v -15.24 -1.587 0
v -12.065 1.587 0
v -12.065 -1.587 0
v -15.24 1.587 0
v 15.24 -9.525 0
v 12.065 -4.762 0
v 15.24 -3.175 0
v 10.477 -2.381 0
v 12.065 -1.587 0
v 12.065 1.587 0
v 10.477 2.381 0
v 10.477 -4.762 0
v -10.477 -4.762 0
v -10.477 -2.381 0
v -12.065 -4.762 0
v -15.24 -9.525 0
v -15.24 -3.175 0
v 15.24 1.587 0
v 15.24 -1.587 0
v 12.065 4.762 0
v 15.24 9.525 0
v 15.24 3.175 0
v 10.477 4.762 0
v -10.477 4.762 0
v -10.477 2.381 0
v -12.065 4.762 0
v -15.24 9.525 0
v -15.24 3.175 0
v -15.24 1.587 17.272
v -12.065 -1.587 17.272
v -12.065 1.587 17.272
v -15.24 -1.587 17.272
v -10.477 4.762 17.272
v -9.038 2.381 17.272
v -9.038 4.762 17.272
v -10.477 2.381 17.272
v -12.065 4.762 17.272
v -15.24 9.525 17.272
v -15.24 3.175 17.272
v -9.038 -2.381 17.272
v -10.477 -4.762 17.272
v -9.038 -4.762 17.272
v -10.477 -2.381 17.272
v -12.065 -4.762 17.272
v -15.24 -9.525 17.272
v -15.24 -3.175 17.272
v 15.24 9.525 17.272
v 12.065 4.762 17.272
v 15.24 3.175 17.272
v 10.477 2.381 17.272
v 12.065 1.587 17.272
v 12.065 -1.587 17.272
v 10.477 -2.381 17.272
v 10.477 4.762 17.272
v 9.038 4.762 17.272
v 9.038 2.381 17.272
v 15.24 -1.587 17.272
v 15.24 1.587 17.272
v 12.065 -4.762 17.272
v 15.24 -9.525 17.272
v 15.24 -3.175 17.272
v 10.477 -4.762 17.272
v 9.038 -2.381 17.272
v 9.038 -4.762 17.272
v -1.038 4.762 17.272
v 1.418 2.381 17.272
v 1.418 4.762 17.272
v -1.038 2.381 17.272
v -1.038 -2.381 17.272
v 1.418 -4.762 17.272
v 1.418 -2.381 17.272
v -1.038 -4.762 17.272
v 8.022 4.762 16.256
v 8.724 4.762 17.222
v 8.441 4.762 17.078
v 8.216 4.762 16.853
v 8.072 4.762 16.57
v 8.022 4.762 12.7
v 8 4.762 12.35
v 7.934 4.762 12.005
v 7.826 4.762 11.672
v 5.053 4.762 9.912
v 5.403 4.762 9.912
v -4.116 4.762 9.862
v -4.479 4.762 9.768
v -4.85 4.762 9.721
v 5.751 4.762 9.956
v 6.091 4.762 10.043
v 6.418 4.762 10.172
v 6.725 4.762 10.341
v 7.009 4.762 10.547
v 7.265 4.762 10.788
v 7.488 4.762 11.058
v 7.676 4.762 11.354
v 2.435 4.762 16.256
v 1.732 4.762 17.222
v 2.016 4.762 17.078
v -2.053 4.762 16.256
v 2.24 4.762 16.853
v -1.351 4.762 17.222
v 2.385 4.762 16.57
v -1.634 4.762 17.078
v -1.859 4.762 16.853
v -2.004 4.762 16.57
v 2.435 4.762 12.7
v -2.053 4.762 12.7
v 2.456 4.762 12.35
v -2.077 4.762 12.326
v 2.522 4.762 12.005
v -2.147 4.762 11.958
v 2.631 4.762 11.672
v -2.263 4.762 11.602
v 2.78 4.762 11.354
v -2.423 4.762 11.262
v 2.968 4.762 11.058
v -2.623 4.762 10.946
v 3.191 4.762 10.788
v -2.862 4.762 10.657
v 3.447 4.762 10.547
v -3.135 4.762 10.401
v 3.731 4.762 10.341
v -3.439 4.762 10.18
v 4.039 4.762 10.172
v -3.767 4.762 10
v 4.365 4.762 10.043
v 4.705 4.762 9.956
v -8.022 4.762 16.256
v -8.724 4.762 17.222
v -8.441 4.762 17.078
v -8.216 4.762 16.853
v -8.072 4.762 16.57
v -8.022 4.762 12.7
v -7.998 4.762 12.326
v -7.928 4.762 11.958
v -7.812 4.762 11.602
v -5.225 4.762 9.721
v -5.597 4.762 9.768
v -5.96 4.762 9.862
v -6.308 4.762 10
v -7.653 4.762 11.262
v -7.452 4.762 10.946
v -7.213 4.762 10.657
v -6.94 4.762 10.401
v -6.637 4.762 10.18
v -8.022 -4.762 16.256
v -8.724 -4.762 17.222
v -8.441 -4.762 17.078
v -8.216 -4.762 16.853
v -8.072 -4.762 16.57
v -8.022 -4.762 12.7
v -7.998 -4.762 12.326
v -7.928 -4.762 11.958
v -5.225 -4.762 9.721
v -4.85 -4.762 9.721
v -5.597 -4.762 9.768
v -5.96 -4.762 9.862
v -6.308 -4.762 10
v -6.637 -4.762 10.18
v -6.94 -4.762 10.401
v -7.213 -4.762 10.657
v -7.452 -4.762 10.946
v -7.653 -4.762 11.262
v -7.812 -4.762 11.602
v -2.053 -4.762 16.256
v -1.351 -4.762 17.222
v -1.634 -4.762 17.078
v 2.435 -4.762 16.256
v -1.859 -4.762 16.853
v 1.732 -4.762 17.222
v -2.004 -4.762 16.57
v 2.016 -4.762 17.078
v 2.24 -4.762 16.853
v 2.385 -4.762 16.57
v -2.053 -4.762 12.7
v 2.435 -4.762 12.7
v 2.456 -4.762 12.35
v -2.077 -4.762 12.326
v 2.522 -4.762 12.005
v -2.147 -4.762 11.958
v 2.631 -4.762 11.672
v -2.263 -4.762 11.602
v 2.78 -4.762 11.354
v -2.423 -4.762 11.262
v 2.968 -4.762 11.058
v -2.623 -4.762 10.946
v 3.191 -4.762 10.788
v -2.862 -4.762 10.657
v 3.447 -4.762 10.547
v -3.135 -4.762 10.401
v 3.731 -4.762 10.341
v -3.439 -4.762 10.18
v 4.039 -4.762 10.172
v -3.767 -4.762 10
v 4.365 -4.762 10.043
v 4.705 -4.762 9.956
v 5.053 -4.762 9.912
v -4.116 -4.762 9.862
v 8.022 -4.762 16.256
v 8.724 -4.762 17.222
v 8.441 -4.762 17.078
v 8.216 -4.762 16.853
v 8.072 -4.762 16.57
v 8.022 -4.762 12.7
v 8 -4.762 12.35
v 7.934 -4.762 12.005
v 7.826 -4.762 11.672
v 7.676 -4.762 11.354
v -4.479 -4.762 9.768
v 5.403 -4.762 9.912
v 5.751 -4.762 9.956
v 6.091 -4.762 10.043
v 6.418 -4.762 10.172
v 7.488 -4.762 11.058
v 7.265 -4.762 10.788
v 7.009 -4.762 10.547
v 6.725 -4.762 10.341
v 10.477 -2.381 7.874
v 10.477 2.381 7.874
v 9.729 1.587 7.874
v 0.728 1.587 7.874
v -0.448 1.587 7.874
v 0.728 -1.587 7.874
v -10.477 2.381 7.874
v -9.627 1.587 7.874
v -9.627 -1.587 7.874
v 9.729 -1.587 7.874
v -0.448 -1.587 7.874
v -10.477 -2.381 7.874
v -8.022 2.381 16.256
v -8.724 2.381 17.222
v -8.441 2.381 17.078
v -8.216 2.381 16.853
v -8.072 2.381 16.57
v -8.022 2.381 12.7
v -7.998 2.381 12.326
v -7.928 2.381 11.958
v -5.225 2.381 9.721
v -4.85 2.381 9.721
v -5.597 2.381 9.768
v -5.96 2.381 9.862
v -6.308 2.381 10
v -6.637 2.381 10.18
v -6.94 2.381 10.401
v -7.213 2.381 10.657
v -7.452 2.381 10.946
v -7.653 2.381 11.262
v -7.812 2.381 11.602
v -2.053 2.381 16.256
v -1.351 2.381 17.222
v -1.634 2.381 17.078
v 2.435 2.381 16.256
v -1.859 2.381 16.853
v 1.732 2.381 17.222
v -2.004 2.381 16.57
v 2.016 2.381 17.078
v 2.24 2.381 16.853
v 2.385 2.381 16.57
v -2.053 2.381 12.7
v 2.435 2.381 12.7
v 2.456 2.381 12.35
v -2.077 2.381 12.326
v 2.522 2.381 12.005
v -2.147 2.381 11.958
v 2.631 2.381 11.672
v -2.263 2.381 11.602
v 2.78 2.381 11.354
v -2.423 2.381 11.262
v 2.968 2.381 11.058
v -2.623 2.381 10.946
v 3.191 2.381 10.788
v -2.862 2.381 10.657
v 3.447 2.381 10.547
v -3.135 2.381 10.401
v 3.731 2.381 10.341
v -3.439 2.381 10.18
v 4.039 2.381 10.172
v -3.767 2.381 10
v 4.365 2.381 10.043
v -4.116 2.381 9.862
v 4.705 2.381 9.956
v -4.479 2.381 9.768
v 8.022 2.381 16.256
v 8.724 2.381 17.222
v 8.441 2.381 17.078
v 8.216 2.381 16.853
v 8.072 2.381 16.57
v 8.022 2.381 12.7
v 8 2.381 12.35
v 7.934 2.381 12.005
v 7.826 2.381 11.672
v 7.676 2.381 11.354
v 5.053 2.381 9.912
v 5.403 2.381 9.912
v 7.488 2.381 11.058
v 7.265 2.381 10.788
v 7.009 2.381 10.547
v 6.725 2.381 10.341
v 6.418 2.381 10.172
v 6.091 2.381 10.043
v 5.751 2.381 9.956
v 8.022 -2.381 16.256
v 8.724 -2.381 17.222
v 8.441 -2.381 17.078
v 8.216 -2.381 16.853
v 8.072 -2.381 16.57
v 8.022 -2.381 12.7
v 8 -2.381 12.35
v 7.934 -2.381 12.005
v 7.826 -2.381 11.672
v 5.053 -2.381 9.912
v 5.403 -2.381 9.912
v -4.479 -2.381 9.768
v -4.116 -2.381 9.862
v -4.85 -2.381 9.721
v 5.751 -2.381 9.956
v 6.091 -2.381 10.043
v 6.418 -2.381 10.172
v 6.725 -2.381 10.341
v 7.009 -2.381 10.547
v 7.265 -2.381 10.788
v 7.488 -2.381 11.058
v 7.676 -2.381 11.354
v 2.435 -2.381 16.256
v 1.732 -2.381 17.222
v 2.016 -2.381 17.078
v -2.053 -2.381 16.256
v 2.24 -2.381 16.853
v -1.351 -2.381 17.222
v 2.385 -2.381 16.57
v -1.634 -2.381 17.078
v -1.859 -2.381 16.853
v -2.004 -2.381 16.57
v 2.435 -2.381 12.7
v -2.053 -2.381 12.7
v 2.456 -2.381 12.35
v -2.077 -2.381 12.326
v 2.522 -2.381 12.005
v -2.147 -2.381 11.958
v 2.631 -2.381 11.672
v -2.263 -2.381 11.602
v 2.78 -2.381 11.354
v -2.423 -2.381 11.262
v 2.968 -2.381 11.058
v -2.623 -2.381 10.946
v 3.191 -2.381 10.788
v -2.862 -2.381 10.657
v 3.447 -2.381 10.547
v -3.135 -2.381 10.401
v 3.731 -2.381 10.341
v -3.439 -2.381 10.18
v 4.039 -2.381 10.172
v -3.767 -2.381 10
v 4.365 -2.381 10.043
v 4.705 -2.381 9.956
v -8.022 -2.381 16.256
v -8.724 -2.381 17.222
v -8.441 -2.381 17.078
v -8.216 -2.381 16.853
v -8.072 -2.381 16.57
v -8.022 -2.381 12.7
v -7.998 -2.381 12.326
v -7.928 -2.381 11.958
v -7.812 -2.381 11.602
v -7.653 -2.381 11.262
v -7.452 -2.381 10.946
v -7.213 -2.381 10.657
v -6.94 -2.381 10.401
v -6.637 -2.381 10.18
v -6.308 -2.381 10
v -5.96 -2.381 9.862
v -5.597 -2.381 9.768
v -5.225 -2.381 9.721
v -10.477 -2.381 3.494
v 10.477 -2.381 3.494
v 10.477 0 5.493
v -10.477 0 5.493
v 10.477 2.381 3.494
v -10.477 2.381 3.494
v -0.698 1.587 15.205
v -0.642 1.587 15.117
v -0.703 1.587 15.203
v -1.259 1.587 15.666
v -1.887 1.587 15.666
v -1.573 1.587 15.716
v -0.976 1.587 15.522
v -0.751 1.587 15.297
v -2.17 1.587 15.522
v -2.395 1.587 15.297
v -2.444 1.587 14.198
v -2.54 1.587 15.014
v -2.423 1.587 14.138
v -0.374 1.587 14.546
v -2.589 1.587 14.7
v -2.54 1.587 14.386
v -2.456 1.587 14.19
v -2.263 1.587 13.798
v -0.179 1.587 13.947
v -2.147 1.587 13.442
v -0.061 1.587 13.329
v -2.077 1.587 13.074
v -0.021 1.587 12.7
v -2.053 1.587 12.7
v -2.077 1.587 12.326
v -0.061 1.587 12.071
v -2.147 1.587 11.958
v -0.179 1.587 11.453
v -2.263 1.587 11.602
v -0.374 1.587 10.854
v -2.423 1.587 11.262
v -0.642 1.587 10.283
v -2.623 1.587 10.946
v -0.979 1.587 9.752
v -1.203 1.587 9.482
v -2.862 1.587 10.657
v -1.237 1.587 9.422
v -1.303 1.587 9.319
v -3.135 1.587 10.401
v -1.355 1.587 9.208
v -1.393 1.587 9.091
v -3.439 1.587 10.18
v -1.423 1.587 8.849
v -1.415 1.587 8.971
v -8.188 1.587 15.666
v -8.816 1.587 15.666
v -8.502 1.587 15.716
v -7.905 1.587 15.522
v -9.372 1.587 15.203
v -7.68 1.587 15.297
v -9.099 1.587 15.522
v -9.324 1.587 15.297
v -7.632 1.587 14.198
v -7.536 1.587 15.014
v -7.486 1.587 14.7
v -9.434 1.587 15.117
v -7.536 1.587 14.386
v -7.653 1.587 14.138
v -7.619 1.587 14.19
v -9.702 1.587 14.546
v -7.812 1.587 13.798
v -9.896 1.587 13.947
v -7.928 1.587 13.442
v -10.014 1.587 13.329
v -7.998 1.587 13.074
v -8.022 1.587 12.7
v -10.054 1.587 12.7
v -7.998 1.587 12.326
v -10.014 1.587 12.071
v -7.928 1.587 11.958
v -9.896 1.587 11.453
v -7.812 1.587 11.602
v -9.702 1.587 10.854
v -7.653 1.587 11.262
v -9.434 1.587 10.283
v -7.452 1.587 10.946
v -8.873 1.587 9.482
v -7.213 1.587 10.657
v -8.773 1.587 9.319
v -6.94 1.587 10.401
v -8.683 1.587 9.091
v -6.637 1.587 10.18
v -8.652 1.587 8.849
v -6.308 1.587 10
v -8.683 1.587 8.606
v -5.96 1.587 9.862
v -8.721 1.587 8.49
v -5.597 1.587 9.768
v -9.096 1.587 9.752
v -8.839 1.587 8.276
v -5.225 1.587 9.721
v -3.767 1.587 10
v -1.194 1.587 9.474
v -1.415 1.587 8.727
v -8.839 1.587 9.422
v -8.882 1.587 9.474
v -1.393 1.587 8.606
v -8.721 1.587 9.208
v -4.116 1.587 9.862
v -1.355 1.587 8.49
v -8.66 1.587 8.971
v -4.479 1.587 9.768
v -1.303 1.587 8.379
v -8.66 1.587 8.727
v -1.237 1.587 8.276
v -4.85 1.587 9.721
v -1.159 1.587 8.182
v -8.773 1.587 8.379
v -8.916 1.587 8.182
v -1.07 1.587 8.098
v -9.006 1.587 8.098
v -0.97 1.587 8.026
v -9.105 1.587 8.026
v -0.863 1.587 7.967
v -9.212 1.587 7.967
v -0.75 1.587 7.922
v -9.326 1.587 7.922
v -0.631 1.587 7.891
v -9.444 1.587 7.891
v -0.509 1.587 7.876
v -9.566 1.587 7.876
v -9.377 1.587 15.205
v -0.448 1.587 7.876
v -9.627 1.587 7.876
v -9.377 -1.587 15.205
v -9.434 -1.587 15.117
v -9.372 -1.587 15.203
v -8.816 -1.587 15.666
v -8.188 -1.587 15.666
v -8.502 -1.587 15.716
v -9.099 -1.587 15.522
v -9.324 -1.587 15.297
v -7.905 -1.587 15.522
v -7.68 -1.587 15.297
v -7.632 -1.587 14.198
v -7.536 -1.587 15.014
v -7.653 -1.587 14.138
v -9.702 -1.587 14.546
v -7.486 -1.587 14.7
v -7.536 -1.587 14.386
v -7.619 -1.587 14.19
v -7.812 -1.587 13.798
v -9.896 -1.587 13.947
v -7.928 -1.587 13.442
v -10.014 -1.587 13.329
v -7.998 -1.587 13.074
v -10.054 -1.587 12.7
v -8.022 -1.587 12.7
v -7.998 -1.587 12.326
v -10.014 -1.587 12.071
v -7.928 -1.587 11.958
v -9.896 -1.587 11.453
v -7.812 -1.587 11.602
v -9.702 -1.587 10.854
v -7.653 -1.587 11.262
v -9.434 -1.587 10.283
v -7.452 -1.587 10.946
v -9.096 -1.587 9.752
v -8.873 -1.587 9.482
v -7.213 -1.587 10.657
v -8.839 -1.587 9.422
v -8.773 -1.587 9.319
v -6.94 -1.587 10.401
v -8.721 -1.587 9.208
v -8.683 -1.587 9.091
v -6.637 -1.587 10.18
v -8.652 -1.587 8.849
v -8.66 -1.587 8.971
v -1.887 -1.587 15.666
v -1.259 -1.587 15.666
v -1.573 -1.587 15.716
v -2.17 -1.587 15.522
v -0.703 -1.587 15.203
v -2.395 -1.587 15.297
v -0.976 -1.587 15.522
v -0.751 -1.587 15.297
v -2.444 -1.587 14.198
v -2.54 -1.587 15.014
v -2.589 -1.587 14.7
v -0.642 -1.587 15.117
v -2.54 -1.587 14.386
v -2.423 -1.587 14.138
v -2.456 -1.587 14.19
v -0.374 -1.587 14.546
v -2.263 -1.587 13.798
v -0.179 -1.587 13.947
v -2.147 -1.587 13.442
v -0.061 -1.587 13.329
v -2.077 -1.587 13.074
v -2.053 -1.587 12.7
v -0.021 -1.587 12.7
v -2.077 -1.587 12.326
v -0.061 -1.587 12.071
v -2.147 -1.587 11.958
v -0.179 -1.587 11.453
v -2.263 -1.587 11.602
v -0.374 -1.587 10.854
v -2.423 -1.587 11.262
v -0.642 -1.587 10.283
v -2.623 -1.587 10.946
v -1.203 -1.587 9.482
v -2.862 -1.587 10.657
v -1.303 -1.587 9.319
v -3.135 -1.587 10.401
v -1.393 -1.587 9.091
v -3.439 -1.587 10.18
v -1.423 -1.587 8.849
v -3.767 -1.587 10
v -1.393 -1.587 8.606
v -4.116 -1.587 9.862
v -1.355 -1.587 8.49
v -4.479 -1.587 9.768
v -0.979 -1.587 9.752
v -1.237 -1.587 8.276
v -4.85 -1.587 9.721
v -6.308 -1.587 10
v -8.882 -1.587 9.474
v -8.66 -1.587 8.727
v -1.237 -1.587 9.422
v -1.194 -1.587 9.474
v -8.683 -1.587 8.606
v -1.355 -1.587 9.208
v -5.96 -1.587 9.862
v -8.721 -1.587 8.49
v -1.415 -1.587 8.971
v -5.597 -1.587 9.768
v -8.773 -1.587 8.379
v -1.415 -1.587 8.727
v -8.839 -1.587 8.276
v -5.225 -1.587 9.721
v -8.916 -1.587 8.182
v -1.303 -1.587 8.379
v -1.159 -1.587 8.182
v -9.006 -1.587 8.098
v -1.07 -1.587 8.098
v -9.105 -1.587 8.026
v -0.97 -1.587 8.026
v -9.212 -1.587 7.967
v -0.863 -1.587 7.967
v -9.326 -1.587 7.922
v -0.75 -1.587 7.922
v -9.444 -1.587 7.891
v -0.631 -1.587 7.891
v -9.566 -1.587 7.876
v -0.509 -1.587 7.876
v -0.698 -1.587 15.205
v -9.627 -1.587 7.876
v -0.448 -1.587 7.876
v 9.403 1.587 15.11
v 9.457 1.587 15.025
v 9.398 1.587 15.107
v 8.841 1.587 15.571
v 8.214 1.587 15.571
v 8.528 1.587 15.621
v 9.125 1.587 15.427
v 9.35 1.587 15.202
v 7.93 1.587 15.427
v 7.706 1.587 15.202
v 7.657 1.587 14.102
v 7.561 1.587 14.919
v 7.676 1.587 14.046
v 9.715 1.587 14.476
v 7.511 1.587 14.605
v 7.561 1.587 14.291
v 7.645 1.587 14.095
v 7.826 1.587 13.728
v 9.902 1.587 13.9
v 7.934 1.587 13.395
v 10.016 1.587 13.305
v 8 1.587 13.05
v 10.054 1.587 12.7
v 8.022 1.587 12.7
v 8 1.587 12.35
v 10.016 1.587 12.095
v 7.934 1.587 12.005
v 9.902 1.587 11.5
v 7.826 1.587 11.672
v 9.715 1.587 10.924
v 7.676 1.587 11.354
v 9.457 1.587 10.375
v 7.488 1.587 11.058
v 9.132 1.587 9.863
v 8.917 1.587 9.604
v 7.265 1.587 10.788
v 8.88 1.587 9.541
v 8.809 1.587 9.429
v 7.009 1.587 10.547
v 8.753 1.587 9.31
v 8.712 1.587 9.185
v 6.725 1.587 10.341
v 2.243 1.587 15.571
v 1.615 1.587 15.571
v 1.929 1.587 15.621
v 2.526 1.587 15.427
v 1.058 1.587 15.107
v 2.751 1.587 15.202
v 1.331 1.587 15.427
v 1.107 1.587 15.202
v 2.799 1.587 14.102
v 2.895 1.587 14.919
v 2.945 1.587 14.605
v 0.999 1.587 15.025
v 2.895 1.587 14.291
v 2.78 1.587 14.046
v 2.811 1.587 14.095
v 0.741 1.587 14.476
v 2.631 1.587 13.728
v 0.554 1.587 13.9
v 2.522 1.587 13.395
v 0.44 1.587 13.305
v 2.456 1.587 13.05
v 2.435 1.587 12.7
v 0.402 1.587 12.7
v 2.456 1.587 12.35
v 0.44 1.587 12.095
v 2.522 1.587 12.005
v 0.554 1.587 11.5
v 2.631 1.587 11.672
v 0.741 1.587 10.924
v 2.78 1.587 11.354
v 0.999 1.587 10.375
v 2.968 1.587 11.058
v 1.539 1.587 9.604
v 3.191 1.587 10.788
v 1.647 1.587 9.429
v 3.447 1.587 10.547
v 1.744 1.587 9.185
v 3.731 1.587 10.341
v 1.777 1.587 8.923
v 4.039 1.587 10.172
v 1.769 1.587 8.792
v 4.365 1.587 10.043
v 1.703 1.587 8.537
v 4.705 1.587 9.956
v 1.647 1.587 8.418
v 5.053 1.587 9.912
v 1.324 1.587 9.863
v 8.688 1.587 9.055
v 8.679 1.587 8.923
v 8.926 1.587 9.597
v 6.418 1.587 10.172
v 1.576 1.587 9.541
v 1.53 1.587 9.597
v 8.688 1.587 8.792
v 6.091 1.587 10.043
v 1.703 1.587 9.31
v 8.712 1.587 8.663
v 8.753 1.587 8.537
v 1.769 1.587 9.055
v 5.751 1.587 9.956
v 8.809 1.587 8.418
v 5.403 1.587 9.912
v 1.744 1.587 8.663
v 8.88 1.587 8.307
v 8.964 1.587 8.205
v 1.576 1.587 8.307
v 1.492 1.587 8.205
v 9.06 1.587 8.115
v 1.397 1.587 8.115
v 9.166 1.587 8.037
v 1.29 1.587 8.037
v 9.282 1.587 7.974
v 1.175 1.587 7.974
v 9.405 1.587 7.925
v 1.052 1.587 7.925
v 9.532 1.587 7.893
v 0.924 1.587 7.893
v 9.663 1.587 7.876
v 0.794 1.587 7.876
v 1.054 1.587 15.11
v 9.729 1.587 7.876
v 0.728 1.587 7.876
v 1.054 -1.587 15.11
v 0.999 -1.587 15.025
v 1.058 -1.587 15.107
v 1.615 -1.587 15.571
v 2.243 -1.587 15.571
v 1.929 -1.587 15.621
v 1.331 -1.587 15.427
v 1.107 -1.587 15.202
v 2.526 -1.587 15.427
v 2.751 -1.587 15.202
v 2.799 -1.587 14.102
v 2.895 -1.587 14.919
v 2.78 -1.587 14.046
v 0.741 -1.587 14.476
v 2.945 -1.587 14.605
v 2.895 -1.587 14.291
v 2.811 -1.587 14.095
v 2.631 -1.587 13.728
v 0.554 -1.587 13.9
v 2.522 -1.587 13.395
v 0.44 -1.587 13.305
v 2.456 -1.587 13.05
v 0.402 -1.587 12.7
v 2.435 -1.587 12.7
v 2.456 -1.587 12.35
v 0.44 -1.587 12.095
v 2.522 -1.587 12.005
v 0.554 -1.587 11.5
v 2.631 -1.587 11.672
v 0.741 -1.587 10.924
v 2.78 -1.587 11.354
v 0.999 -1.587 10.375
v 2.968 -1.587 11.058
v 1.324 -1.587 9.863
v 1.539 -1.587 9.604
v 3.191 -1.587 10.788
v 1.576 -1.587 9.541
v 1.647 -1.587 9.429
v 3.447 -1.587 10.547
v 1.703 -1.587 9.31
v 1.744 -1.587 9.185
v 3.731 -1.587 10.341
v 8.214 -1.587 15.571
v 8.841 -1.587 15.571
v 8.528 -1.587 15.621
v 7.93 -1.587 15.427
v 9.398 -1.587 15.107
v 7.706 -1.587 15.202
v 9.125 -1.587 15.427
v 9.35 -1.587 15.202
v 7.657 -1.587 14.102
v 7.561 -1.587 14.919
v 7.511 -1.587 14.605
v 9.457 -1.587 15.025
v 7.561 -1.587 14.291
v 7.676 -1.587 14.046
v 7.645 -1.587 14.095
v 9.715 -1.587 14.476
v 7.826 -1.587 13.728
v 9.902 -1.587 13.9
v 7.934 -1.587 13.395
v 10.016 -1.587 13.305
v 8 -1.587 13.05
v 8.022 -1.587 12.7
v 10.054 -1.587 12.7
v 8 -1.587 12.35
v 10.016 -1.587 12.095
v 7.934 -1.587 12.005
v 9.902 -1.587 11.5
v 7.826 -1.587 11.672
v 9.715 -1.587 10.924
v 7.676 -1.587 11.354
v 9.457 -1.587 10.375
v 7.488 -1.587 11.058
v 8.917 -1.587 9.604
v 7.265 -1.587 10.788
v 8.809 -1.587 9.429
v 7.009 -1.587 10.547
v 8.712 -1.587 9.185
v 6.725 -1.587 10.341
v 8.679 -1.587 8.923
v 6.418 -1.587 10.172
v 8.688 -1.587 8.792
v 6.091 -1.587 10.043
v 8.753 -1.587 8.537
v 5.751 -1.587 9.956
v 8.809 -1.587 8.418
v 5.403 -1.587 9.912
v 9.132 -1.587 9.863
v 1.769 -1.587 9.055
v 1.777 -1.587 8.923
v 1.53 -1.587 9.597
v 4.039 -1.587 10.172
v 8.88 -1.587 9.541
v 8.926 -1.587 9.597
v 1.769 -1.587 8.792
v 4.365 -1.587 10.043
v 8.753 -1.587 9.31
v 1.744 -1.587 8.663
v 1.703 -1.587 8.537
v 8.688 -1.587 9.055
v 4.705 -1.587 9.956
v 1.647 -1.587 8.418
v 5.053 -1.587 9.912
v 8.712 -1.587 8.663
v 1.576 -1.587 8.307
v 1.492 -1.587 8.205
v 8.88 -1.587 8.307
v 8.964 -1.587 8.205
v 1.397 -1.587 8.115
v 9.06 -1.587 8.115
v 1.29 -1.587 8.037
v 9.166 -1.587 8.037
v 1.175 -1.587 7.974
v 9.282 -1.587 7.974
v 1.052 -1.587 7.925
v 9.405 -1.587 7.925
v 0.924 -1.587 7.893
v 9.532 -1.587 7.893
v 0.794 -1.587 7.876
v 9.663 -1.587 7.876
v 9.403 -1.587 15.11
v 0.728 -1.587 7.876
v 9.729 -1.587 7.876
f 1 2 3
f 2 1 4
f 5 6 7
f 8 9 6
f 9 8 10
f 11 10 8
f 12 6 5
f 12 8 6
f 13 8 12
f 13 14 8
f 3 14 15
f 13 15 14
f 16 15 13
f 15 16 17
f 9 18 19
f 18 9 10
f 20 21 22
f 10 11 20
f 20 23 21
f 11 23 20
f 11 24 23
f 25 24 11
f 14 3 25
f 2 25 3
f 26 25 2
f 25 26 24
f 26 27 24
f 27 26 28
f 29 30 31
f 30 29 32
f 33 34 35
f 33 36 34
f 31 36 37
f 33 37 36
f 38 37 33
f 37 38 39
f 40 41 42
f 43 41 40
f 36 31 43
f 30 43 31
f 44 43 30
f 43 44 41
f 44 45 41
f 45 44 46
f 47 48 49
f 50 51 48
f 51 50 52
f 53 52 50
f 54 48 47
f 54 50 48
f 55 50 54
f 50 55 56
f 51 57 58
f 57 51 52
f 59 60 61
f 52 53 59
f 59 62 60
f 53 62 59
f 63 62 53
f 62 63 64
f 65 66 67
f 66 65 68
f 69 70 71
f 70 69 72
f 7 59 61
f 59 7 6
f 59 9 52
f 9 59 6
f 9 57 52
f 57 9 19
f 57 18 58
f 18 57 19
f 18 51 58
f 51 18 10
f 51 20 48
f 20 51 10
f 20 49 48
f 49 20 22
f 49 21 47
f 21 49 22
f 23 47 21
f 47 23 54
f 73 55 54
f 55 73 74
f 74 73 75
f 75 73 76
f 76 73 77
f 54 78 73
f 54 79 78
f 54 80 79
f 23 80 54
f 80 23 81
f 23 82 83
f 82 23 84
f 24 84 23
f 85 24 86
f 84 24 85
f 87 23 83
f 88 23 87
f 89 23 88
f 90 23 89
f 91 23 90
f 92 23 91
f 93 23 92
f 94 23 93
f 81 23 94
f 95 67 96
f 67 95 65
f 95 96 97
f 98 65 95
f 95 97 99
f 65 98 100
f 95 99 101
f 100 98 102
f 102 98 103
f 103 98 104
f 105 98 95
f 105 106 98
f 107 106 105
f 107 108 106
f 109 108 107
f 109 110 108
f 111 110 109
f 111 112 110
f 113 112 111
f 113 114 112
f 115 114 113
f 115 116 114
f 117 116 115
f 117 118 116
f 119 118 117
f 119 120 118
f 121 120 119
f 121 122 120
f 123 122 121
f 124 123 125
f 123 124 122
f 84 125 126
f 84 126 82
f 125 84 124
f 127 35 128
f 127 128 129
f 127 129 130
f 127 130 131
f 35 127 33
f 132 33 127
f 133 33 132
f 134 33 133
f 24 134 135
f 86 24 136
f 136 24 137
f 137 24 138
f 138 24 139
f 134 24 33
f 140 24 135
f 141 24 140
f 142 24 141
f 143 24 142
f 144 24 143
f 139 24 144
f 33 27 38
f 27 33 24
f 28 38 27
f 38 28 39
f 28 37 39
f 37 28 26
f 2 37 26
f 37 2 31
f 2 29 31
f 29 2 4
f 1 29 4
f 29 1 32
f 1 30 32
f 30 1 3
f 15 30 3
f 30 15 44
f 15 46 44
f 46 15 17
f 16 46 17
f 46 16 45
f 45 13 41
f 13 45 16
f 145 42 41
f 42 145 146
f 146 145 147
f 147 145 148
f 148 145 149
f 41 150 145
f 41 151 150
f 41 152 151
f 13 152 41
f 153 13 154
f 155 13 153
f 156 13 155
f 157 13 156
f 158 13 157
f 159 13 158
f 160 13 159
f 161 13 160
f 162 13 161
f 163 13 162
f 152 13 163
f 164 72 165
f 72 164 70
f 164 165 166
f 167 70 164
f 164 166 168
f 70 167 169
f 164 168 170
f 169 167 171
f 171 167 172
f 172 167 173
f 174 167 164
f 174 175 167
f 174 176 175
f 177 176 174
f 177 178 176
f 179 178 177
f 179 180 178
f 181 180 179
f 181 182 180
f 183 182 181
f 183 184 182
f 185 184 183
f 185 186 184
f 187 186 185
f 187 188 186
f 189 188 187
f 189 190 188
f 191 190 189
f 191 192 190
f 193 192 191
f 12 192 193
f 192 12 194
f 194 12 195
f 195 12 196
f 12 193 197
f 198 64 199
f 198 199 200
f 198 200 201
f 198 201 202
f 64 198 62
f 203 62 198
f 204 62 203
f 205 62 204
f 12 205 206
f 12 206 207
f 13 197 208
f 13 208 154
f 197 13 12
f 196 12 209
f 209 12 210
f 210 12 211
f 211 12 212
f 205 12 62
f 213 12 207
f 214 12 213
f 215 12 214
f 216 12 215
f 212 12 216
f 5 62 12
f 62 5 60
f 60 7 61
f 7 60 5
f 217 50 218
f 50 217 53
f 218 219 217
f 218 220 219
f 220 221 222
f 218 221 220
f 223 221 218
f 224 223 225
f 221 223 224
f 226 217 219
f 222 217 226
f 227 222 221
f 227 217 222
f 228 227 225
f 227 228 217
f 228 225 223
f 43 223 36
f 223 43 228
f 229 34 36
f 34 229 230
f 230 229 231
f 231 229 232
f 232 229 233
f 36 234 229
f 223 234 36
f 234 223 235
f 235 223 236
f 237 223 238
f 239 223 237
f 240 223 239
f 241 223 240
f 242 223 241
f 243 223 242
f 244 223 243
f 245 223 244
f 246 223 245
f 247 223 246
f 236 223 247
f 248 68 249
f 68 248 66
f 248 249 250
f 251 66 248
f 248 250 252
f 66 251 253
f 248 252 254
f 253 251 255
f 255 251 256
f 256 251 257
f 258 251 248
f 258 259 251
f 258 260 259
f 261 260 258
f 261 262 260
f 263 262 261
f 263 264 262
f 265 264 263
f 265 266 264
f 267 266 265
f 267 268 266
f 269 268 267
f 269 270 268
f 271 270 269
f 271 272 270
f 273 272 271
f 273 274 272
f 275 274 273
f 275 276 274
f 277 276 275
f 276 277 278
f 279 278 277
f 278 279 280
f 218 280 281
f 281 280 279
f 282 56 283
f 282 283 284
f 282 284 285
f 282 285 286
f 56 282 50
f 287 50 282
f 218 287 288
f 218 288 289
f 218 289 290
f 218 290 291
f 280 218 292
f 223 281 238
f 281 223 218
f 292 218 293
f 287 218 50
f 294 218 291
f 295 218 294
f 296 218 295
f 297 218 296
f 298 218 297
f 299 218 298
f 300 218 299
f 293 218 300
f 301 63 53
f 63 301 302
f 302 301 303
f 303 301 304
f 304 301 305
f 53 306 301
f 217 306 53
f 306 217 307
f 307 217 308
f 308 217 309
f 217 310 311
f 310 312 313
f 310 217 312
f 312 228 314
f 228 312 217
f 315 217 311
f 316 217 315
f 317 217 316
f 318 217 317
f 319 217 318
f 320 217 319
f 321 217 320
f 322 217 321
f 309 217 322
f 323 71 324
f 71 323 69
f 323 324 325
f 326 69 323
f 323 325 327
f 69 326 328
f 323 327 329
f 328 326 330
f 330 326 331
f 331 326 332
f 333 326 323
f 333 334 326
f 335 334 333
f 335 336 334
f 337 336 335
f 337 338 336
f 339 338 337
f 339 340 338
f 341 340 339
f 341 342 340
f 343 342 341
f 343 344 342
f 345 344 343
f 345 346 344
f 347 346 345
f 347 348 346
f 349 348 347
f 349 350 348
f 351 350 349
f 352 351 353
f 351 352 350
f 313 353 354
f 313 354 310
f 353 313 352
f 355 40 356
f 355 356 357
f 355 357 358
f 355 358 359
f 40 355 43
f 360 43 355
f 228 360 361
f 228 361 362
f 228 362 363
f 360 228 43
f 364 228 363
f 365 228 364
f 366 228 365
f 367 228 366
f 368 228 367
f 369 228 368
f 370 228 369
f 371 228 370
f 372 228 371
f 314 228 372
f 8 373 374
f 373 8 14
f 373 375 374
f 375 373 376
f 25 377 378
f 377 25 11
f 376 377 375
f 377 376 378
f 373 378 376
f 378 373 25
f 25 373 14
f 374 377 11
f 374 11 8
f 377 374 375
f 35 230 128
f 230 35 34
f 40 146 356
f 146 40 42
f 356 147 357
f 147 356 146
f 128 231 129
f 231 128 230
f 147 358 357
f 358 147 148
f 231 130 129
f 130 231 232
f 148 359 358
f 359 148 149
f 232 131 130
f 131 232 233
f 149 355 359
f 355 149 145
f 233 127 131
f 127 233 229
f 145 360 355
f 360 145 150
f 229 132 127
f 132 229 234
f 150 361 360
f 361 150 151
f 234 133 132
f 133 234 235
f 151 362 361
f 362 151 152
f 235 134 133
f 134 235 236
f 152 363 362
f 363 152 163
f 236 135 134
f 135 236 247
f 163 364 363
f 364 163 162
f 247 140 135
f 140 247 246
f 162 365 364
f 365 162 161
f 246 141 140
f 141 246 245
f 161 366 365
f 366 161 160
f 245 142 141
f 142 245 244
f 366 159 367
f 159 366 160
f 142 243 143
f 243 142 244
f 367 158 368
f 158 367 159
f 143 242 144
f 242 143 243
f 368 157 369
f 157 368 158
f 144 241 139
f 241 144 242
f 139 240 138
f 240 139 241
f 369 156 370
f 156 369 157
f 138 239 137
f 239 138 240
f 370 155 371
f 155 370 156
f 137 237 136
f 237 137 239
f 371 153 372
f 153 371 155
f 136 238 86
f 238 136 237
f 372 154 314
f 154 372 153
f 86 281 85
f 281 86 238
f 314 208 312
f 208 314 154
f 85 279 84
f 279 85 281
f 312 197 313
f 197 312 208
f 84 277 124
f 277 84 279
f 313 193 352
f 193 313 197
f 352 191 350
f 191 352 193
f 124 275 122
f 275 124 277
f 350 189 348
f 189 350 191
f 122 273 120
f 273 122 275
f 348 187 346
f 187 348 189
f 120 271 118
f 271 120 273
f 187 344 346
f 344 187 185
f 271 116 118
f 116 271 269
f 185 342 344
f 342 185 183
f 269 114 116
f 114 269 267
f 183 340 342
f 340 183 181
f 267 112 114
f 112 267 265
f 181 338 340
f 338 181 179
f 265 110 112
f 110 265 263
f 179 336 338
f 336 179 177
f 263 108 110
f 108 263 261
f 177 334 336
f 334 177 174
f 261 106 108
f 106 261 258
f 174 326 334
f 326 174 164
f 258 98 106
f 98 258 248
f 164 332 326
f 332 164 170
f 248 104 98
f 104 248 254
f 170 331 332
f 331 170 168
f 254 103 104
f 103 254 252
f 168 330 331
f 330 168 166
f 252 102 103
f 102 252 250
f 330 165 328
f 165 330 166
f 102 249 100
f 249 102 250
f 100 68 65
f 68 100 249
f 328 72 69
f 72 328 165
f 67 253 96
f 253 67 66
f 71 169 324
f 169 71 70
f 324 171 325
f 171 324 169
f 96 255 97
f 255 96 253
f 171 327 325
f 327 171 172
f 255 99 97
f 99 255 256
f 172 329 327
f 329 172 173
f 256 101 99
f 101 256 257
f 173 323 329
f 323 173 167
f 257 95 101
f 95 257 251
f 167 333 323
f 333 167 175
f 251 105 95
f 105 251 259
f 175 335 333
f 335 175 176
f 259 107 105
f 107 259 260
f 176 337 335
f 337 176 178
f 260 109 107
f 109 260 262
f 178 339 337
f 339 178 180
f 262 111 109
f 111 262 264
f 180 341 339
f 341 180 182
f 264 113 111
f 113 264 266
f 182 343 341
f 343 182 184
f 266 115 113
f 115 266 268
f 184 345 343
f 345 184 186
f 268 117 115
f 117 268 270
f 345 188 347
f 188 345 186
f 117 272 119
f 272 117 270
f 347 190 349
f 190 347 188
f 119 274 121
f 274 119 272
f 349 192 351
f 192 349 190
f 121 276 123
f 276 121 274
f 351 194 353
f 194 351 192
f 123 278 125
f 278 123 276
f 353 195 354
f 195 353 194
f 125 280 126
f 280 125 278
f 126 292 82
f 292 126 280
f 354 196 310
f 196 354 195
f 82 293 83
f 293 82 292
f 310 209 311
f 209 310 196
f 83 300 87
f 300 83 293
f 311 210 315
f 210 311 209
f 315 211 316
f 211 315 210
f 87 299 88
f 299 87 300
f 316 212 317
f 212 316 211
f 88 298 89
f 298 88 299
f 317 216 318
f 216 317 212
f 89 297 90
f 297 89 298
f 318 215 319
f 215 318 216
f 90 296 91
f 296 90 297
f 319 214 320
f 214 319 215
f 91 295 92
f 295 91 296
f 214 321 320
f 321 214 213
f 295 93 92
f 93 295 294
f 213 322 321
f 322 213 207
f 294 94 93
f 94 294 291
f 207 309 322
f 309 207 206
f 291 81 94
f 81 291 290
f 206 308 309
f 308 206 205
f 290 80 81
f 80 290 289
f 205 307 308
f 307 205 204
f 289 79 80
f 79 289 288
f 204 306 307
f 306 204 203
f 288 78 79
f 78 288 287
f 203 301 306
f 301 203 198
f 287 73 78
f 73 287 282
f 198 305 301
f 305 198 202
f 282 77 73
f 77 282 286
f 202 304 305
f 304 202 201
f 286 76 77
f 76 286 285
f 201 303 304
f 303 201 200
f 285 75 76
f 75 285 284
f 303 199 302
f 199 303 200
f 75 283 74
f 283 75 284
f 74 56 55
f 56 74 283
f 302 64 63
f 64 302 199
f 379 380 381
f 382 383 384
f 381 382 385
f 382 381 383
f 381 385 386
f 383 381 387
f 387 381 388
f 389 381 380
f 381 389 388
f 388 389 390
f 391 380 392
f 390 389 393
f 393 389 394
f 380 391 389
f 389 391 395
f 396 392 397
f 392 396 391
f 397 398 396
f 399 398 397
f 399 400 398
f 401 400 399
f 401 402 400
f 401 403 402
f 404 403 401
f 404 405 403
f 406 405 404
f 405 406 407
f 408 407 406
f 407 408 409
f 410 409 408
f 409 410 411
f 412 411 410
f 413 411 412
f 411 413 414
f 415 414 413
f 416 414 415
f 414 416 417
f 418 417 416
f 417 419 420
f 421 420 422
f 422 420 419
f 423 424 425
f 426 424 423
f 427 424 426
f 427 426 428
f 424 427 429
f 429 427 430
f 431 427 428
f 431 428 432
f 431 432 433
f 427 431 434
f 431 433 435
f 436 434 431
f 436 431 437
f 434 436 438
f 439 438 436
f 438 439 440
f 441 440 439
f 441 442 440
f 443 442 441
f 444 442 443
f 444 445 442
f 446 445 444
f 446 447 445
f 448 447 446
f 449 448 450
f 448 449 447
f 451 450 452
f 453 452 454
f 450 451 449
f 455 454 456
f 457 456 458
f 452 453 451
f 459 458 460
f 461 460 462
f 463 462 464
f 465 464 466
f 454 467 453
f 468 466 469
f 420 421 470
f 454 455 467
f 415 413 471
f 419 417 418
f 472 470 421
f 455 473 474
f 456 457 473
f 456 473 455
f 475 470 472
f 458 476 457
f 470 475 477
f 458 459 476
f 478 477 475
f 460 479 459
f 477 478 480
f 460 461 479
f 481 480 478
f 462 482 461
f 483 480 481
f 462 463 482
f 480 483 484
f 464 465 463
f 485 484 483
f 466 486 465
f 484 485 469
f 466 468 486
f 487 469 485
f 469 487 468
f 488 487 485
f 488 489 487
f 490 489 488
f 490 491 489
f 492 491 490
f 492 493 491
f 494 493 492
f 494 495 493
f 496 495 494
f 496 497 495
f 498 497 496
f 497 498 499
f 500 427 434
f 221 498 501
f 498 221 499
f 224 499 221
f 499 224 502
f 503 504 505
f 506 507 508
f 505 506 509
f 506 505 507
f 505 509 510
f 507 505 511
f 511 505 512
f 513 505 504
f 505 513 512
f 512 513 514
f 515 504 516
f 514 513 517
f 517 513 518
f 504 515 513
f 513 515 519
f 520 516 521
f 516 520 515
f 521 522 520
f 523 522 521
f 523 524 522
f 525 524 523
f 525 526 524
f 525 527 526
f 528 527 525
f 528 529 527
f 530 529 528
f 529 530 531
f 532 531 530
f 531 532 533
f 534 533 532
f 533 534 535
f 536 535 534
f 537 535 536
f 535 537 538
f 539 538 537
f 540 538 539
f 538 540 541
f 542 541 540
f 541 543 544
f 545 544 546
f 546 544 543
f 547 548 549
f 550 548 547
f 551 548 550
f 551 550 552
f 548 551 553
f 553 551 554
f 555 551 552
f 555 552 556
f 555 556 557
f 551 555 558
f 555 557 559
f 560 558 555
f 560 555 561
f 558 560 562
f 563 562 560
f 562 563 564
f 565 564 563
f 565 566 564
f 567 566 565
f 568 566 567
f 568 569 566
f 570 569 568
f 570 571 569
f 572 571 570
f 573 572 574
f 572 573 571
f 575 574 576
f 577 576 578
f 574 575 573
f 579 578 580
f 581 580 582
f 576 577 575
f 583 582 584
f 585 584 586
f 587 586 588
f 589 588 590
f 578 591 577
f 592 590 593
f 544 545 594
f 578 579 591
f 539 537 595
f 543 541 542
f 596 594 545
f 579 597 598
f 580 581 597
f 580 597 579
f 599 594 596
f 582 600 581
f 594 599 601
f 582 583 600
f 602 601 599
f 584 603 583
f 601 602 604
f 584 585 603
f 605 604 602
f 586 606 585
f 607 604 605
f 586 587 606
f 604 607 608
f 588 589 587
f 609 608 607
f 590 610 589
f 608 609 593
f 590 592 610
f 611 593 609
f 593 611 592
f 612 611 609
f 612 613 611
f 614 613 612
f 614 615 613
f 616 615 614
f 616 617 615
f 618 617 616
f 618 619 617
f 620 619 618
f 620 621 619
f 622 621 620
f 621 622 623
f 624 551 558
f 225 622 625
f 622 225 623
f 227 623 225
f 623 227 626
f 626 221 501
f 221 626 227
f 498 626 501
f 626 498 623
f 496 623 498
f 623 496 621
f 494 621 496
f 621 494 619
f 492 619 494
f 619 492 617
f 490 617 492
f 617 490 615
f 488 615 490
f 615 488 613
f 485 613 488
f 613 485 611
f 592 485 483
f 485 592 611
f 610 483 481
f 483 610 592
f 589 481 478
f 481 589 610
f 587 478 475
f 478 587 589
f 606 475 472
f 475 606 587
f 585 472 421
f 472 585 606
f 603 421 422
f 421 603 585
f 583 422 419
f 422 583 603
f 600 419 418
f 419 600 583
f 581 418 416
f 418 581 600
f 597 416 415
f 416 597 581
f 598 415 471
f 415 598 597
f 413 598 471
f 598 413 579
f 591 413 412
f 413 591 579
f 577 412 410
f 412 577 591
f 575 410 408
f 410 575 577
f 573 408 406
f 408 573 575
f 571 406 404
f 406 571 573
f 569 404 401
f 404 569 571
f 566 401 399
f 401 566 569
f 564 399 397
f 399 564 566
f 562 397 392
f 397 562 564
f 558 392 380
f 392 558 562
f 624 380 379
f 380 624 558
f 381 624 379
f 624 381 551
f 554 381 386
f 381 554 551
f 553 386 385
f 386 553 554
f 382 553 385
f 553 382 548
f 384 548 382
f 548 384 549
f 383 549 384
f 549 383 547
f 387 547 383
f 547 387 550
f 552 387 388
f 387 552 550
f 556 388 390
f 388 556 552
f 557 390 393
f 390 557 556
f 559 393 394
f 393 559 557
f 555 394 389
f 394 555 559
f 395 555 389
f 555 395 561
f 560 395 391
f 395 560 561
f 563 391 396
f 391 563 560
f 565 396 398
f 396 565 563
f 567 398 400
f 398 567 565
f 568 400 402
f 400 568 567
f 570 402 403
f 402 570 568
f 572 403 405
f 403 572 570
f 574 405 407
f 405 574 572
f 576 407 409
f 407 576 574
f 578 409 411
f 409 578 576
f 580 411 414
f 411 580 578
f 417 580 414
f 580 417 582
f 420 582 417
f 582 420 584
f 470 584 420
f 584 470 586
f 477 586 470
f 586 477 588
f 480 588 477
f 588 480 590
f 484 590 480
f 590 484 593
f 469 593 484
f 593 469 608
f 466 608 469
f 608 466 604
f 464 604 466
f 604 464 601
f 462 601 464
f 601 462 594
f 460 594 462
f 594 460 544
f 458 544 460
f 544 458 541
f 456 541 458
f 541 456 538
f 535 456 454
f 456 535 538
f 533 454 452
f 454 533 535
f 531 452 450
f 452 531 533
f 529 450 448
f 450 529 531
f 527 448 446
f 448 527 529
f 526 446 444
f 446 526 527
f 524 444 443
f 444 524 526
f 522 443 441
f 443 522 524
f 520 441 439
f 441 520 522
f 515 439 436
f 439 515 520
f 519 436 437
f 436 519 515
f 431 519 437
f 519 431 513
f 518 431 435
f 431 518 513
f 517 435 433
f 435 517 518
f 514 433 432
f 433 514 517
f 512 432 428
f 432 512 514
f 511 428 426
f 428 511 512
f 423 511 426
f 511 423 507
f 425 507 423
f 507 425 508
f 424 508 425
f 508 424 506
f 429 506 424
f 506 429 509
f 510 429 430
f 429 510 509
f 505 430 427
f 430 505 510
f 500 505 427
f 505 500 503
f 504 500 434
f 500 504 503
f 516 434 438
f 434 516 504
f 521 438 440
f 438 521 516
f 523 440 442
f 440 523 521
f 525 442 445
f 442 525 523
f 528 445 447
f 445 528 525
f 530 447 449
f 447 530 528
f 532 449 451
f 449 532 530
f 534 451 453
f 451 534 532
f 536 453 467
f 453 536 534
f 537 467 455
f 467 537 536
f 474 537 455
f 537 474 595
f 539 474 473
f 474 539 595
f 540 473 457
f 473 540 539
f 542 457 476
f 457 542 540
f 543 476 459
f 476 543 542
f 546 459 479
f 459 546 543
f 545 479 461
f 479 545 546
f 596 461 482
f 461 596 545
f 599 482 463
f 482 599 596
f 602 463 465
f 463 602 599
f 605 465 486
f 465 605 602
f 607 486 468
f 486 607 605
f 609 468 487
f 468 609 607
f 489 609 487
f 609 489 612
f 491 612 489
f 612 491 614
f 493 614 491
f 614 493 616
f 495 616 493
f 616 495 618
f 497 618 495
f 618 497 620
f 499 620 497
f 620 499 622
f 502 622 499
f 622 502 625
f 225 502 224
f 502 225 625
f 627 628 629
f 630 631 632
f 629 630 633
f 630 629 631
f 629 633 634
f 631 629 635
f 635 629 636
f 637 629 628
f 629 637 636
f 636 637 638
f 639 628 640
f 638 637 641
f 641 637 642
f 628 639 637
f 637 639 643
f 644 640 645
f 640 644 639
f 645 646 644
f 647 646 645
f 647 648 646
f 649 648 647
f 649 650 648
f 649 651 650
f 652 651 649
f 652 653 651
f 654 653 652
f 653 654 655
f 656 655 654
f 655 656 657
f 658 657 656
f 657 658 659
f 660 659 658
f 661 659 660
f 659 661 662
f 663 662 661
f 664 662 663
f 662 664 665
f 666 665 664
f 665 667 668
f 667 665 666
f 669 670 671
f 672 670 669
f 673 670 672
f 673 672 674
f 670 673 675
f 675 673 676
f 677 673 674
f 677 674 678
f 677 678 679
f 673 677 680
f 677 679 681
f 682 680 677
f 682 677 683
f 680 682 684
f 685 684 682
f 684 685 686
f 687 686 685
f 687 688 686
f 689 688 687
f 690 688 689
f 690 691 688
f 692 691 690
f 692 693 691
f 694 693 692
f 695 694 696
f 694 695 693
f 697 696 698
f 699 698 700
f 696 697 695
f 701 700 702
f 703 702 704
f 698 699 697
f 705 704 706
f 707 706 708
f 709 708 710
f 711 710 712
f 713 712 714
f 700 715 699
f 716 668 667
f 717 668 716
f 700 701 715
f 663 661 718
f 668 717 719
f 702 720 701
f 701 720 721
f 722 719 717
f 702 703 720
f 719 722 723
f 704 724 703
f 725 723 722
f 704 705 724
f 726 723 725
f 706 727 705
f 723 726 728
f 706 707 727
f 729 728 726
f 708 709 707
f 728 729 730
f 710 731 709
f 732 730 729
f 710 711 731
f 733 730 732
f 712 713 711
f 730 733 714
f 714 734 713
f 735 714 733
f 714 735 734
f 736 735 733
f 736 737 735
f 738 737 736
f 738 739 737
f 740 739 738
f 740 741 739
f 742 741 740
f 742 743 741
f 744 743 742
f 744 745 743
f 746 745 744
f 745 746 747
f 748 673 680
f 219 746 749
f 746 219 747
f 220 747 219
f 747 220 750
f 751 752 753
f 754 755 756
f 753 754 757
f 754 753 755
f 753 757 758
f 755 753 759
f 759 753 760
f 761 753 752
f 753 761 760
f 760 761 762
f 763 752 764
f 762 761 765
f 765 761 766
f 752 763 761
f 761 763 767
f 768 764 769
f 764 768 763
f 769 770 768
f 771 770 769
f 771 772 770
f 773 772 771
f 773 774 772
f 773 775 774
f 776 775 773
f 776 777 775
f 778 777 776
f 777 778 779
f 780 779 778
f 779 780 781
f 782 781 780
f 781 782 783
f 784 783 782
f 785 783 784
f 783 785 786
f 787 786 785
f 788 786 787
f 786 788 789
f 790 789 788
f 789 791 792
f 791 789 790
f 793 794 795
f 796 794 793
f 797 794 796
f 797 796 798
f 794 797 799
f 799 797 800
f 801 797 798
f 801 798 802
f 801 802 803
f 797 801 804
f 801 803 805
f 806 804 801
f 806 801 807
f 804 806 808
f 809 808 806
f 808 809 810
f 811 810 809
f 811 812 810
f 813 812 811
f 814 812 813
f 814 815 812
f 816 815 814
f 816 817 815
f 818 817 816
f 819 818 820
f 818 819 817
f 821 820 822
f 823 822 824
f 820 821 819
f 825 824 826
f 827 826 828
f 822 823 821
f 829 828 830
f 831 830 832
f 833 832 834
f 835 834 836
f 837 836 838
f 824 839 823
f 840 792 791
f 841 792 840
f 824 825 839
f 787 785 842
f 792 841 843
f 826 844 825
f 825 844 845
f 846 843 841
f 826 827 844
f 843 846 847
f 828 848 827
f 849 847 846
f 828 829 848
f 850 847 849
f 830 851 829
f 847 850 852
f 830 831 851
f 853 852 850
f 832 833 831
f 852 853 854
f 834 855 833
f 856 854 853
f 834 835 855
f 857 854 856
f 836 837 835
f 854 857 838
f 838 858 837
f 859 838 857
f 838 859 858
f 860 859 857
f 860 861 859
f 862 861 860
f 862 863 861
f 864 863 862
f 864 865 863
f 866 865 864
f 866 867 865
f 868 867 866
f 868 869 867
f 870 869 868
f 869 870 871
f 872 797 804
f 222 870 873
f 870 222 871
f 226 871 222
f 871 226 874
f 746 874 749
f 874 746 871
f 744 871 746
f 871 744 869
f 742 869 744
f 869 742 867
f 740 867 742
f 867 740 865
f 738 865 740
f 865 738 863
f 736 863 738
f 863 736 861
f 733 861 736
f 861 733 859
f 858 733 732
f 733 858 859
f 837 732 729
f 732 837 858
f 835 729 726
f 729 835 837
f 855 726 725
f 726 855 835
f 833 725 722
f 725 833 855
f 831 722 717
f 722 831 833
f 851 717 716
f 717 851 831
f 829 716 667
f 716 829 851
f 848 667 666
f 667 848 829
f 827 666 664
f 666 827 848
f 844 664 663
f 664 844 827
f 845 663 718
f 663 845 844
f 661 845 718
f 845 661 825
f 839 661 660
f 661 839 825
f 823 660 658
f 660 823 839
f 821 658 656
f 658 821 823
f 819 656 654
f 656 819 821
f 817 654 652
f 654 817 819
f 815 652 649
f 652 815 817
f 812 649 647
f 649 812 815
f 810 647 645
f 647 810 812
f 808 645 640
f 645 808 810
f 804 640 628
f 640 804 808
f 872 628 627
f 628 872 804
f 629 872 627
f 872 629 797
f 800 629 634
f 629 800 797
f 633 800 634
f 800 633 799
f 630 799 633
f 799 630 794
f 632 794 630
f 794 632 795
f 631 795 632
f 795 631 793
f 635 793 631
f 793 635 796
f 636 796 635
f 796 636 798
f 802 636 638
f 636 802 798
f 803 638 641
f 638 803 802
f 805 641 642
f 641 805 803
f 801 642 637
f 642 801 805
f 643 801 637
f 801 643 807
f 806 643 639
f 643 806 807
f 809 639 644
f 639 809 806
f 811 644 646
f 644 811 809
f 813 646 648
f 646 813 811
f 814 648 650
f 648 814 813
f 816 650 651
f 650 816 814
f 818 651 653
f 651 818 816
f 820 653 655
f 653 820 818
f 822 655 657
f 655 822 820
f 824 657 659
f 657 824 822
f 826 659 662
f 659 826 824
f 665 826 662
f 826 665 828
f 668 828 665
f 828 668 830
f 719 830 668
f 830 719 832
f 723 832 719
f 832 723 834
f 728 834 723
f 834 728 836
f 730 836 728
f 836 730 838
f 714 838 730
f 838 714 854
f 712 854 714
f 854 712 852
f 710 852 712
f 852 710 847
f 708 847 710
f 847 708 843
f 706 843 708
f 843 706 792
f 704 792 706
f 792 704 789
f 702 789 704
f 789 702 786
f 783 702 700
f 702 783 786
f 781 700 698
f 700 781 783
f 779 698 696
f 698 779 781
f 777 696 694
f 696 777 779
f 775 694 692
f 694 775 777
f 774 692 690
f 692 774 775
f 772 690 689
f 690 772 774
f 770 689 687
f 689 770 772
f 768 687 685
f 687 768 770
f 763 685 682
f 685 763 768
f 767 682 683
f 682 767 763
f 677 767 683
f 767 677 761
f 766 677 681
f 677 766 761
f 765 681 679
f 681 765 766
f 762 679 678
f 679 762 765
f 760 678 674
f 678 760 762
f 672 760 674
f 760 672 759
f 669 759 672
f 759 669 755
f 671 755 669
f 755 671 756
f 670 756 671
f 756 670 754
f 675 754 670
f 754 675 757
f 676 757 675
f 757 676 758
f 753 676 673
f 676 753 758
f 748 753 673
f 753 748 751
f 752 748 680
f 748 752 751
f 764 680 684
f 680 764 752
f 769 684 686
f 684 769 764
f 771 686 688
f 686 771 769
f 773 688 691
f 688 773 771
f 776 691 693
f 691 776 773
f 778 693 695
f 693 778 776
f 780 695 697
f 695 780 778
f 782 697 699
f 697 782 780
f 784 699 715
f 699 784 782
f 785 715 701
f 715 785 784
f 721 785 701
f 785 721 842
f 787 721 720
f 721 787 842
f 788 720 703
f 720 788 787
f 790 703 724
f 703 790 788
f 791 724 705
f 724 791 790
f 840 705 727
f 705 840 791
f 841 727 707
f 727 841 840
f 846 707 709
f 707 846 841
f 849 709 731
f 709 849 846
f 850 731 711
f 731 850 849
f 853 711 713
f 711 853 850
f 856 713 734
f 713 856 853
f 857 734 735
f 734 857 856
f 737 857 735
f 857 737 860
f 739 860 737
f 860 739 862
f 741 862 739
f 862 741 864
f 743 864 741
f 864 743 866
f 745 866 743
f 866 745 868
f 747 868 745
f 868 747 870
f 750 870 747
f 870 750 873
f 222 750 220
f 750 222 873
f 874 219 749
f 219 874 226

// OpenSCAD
/********************************************************//**
 * Customizable DeWALT DW2190 Divider with Two Shank Clasps *
 * by Tobin Kyllingstad                                     *
 * 2019/05/05                                               *
 *                                                          *
 * Divider for DeWalt Medium Tough Case (DW2190) with two   *
 * integrated shank clasps.                                 *
 * https://www.thingiverse.com/kyllingstad                  *
 ************************************************************/
// (inches or millimeters)
Units = 1; // [1:in,25.4:mm]
// Shank Clasp A Inner Diameter
Shank_A_Diameter = 0.235;
// Shank Clasp B Inner Diameter
Shank_B_Diameter = 0.22;
// Height of shank axis above base
Axis_Height = 0.5;
// Shank clasp thickness
Clasp_Thickness = 0.08;
// Shank clasp width
Clasp_Width = 0.125;
// Gap between clasp and wall
Gap_Width = 0.03125;
// Outer wall width
Wall_Width = 0.09375;
// Thickness of supporting structure
Floor_Thickness = 0.09375;
/* [Hidden] */
max_overhang_angle = 50;
margin = 0.001;
a_inner_radius = Shank_A_Diameter/2/Units;
b_inner_radius = Shank_B_Diameter/2/Units;
axis_height = Axis_Height/Units;
clasp_thickness = Clasp_Thickness/Units;
clasp_width = Clasp_Width/Units;
gap_width = Gap_Width/Units;
wall_width = Wall_Width/Units;
floor_thickness = Floor_Thickness/Units;

scale([25.4, 25.4, 25.4])
{
   two_clasp_divider( a_inner_radius, b_inner_radius, axis_height, clasp_thickness, clasp_width,
                      gap_width, wall_width, floor_thickness );
}

module two_clasp_divider( a_inner_radius,
                          b_inner_radius,
                          axis_height,
                          clasp_thickness,
                          clasp_width,
                          gap_width,
                          wall_width,
                          floor_thickness )
{
   div_height = 0.68;
   div_width = 1.2;
   div_depth = 0.75;
   hole_width = div_width - 0.375;
   space = (hole_width - 2*a_inner_radius - 2*b_inner_radius - 4*clasp_thickness) / 3;
   a_offset = -(hole_width/2 - space - a_inner_radius - clasp_thickness);
   b_offset =  (hole_width/2 - space - b_inner_radius - clasp_thickness);
   min_inner_radius = min( a_inner_radius, b_inner_radius );
   floor_height = max( axis_height - min_inner_radius - clasp_thickness, floor_thickness );
   union()
   {
      difference()
      {
         divider( div_height, div_width, div_depth, hole_width, clasp_thickness, clasp_width,
                  floor_thickness, floor_height, gap_width, wall_width );
         translate([ a_offset, 0, 0 ])
         {
            slot( a_inner_radius, clasp_thickness/2, div_height - axis_height, div_depth, axis_height );
         }
         translate([ b_offset, 0, 0 ])
         {
            slot( b_inner_radius, clasp_thickness/2, div_height - axis_height, div_depth, axis_height );
         }
      }
      translate([ 0, 0, axis_height ])
      {
         translate([ a_offset, 0, 0 ])
         {
            clasp( a_inner_radius, clasp_thickness, axis_height - floor_height, clasp_width );
         }
         translate([ b_offset, 0, 0 ])
         {
            clasp( b_inner_radius, clasp_thickness, axis_height - floor_height, clasp_width );
         }
      }
   }
}

module divider( height,
                width,
                depth,
                hole_width,
                clasp_thickness,
                clasp_width,
                floor_thickness,
                floor_height,
                gap_width,
                wall_width )
{
   middle = clasp_width + 2*gap_width + 2*wall_width;
   hole_height = height - floor_thickness;
   hole_depth = clasp_width + 2*gap_width;
   difference()
   {
      divider_base( width, depth, middle, height );
      translate( [ 0, 0, floor_height + height/2 ] )
      {
         cube( size=[ hole_width, hole_depth, height ], center=true );
      }
      base_void( hole_width, hole_depth, floor_height - floor_thickness );
   }
}

module divider_base( width,
                     depth,
                     middle,
                     height )
{
   linear_extrude( height, convexity = 10 )
   {
      divider_profile( width, depth, middle );
   }
}

module divider_profile( width,
                        depth,
                        middle )
{
   polygon(points = [ [ width/2, depth/2],
                      [ width/2, 0.125],
                      [ (width/2 - 0.125), 0.1875],
                      [ (width/2 - 0.125), 0.0625],
                      [ width/2, 0.0625],
                      [ width/2,-0.0625],
                      [ (width/2 - 0.125),-0.0625],
                      [ (width/2 - 0.125),-0.1875],
                      [ width/2,-0.125],
                      [ width/2,-depth/2],
                      [ (width/2 + middle/2 - depth/2),-middle/2],
                      [-(width/2 + middle/2 - depth/2),-middle/2],
                      [-width/2,-depth/2],
                      [-width/2,-0.125],
                      [-(width/2 - 0.125),-0.1875],
                      [-(width/2 - 0.125),-0.0625],
                      [-width/2,-0.0625],
                      [-width/2, 0.0625],
                      [-(width/2 - 0.125), 0.0625],
                      [-(width/2 - 0.125), 0.1875],
                      [-width/2, 0.125],
                      [-width/2, depth/2],
                      [-(width/2 + middle/2 - depth/2), middle/2],
                      [ (width/2 + middle/2 - depth/2), middle/2] ]);
}

module slot( inner_radius,
             corner_radius,
             top_to_axis,
             depth,
             axis_height )
{
   translate([0, 0, axis_height])
   {
      rotate([90, 0, 0])
      {
         linear_extrude(height = depth, center = true, convexity = 10 )
         {
            slot_profile( inner_radius, corner_radius, top_to_axis );
         }
      }
   }
}

module slot_profile( inner_radius,
                     corner_radius,
                     top_to_axis )
{
   difference()
   {
      union()
      {
         circle(r = inner_radius, $fn = 50);
         polygon(points = [ [ inner_radius, 0],
                            [ inner_radius, top_to_axis - corner_radius],
                            [ (inner_radius + corner_radius), top_to_axis],
                            [ (inner_radius + corner_radius), top_to_axis + margin],
                            [-(inner_radius + corner_radius), top_to_axis + margin],
                            [-(inner_radius + corner_radius), top_to_axis],
                            [-inner_radius, top_to_axis - corner_radius],
                            [-inner_radius, 0] ]);
      }
      translate([ (inner_radius + corner_radius), top_to_axis - corner_radius])
      {
         circle(r = corner_radius, $fn = 20);
      }
      translate([-(inner_radius + corner_radius), top_to_axis - corner_radius])
      {
         circle(r = corner_radius, $fn = 20);
      }
   }
}

module base_void( width,
                  depth,
                  height )
{
   rotate([0, 0, 90])
   {
      rotate([90, 0, 0])
      {
         translate([0, 0, -width/2])
         {
            linear_extrude(height = width)
            {
               base_void_profile( depth, height );
            }
         }
      }
   }
}

module base_void_profile( depth,
                          height )
{
   polygon(points = [ [ 0, height ],
                      [  depth/2, height - tan(90 - max_overhang_angle) * depth/2 ],
                      [  depth/2, -margin ],
                      [ -depth/2, -margin ],
                      [ -depth/2, height - tan(90 - max_overhang_angle) * depth/2 ] ]);
}

module clasp( inner_radius,
              clasp_thickness,
              base_to_axis,
              clasp_width )
{
   rotate([90,0,0])
   {
      linear_extrude(height = clasp_width, center = true, convexity = 10)
      {
         clasp_profile( inner_radius, clasp_thickness, base_to_axis );
      }
   }
}

module clasp_profile( inner_radius,
                      clasp_thickness,
                      base_to_axis )
{
   outer_radius = inner_radius + clasp_thickness;
   opening_angle = 60;
   fillet_radius = ( min( base_to_axis, outer_radius ) -
                     outer_radius * cos(max_overhang_angle) ) /
                   ( 1 + cos(max_overhang_angle) );
   union()
   {
      difference()
      {
         union()
         {
            circle(r = outer_radius, $fn = 50);
            polygon(points = [ [ 0,0 ],                                         // center of clasp
               [ (outer_radius + fillet_radius) * sin(max_overhang_angle),
                -(outer_radius + fillet_radius) * cos(max_overhang_angle) ],    // center of fillet
               [ (outer_radius + fillet_radius) * sin(max_overhang_angle),
               -((outer_radius + fillet_radius) * cos(max_overhang_angle) +
                 fillet_radius + margin) ],                                     // bottom fillet
               [-(outer_radius + fillet_radius) * sin(max_overhang_angle),
               -((outer_radius + fillet_radius) * cos(max_overhang_angle) +
                 fillet_radius + margin) ],                                     // bottom fillet
               [-(outer_radius + fillet_radius) * sin(max_overhang_angle),
                -(outer_radius + fillet_radius) * cos(max_overhang_angle) ] ]); // center of fillet
         }
         circle(r = inner_radius, $fn = 50);
         translate([ (outer_radius + fillet_radius) * sin(max_overhang_angle),
                    -(outer_radius + fillet_radius) * cos(max_overhang_angle), ])
         {
            circle(r = fillet_radius, $fn = 50);
         }
         translate([-(outer_radius + fillet_radius) * sin(max_overhang_angle),
                    -(outer_radius + fillet_radius) * cos(max_overhang_angle), ])
         {
            circle(r = fillet_radius, $fn = 50);
         }
         polygon(points = [ [ 0,0 ],
            [ (outer_radius) * tan(opening_angle), (outer_radius) ],
            [-(outer_radius) * tan(opening_angle), (outer_radius) ] ]);
      }
      translate([ (inner_radius + clasp_thickness/2) * sin(opening_angle),
                  (inner_radius + clasp_thickness/2) * cos(opening_angle) ])
      {
         circle(d = clasp_thickness, $fn=20);
      }
      translate([-(inner_radius + clasp_thickness/2) * sin(opening_angle),
                  (inner_radius + clasp_thickness/2) * cos(opening_angle) ])
      {
         circle(d = clasp_thickness, $fn=20);
      }
   }
}
